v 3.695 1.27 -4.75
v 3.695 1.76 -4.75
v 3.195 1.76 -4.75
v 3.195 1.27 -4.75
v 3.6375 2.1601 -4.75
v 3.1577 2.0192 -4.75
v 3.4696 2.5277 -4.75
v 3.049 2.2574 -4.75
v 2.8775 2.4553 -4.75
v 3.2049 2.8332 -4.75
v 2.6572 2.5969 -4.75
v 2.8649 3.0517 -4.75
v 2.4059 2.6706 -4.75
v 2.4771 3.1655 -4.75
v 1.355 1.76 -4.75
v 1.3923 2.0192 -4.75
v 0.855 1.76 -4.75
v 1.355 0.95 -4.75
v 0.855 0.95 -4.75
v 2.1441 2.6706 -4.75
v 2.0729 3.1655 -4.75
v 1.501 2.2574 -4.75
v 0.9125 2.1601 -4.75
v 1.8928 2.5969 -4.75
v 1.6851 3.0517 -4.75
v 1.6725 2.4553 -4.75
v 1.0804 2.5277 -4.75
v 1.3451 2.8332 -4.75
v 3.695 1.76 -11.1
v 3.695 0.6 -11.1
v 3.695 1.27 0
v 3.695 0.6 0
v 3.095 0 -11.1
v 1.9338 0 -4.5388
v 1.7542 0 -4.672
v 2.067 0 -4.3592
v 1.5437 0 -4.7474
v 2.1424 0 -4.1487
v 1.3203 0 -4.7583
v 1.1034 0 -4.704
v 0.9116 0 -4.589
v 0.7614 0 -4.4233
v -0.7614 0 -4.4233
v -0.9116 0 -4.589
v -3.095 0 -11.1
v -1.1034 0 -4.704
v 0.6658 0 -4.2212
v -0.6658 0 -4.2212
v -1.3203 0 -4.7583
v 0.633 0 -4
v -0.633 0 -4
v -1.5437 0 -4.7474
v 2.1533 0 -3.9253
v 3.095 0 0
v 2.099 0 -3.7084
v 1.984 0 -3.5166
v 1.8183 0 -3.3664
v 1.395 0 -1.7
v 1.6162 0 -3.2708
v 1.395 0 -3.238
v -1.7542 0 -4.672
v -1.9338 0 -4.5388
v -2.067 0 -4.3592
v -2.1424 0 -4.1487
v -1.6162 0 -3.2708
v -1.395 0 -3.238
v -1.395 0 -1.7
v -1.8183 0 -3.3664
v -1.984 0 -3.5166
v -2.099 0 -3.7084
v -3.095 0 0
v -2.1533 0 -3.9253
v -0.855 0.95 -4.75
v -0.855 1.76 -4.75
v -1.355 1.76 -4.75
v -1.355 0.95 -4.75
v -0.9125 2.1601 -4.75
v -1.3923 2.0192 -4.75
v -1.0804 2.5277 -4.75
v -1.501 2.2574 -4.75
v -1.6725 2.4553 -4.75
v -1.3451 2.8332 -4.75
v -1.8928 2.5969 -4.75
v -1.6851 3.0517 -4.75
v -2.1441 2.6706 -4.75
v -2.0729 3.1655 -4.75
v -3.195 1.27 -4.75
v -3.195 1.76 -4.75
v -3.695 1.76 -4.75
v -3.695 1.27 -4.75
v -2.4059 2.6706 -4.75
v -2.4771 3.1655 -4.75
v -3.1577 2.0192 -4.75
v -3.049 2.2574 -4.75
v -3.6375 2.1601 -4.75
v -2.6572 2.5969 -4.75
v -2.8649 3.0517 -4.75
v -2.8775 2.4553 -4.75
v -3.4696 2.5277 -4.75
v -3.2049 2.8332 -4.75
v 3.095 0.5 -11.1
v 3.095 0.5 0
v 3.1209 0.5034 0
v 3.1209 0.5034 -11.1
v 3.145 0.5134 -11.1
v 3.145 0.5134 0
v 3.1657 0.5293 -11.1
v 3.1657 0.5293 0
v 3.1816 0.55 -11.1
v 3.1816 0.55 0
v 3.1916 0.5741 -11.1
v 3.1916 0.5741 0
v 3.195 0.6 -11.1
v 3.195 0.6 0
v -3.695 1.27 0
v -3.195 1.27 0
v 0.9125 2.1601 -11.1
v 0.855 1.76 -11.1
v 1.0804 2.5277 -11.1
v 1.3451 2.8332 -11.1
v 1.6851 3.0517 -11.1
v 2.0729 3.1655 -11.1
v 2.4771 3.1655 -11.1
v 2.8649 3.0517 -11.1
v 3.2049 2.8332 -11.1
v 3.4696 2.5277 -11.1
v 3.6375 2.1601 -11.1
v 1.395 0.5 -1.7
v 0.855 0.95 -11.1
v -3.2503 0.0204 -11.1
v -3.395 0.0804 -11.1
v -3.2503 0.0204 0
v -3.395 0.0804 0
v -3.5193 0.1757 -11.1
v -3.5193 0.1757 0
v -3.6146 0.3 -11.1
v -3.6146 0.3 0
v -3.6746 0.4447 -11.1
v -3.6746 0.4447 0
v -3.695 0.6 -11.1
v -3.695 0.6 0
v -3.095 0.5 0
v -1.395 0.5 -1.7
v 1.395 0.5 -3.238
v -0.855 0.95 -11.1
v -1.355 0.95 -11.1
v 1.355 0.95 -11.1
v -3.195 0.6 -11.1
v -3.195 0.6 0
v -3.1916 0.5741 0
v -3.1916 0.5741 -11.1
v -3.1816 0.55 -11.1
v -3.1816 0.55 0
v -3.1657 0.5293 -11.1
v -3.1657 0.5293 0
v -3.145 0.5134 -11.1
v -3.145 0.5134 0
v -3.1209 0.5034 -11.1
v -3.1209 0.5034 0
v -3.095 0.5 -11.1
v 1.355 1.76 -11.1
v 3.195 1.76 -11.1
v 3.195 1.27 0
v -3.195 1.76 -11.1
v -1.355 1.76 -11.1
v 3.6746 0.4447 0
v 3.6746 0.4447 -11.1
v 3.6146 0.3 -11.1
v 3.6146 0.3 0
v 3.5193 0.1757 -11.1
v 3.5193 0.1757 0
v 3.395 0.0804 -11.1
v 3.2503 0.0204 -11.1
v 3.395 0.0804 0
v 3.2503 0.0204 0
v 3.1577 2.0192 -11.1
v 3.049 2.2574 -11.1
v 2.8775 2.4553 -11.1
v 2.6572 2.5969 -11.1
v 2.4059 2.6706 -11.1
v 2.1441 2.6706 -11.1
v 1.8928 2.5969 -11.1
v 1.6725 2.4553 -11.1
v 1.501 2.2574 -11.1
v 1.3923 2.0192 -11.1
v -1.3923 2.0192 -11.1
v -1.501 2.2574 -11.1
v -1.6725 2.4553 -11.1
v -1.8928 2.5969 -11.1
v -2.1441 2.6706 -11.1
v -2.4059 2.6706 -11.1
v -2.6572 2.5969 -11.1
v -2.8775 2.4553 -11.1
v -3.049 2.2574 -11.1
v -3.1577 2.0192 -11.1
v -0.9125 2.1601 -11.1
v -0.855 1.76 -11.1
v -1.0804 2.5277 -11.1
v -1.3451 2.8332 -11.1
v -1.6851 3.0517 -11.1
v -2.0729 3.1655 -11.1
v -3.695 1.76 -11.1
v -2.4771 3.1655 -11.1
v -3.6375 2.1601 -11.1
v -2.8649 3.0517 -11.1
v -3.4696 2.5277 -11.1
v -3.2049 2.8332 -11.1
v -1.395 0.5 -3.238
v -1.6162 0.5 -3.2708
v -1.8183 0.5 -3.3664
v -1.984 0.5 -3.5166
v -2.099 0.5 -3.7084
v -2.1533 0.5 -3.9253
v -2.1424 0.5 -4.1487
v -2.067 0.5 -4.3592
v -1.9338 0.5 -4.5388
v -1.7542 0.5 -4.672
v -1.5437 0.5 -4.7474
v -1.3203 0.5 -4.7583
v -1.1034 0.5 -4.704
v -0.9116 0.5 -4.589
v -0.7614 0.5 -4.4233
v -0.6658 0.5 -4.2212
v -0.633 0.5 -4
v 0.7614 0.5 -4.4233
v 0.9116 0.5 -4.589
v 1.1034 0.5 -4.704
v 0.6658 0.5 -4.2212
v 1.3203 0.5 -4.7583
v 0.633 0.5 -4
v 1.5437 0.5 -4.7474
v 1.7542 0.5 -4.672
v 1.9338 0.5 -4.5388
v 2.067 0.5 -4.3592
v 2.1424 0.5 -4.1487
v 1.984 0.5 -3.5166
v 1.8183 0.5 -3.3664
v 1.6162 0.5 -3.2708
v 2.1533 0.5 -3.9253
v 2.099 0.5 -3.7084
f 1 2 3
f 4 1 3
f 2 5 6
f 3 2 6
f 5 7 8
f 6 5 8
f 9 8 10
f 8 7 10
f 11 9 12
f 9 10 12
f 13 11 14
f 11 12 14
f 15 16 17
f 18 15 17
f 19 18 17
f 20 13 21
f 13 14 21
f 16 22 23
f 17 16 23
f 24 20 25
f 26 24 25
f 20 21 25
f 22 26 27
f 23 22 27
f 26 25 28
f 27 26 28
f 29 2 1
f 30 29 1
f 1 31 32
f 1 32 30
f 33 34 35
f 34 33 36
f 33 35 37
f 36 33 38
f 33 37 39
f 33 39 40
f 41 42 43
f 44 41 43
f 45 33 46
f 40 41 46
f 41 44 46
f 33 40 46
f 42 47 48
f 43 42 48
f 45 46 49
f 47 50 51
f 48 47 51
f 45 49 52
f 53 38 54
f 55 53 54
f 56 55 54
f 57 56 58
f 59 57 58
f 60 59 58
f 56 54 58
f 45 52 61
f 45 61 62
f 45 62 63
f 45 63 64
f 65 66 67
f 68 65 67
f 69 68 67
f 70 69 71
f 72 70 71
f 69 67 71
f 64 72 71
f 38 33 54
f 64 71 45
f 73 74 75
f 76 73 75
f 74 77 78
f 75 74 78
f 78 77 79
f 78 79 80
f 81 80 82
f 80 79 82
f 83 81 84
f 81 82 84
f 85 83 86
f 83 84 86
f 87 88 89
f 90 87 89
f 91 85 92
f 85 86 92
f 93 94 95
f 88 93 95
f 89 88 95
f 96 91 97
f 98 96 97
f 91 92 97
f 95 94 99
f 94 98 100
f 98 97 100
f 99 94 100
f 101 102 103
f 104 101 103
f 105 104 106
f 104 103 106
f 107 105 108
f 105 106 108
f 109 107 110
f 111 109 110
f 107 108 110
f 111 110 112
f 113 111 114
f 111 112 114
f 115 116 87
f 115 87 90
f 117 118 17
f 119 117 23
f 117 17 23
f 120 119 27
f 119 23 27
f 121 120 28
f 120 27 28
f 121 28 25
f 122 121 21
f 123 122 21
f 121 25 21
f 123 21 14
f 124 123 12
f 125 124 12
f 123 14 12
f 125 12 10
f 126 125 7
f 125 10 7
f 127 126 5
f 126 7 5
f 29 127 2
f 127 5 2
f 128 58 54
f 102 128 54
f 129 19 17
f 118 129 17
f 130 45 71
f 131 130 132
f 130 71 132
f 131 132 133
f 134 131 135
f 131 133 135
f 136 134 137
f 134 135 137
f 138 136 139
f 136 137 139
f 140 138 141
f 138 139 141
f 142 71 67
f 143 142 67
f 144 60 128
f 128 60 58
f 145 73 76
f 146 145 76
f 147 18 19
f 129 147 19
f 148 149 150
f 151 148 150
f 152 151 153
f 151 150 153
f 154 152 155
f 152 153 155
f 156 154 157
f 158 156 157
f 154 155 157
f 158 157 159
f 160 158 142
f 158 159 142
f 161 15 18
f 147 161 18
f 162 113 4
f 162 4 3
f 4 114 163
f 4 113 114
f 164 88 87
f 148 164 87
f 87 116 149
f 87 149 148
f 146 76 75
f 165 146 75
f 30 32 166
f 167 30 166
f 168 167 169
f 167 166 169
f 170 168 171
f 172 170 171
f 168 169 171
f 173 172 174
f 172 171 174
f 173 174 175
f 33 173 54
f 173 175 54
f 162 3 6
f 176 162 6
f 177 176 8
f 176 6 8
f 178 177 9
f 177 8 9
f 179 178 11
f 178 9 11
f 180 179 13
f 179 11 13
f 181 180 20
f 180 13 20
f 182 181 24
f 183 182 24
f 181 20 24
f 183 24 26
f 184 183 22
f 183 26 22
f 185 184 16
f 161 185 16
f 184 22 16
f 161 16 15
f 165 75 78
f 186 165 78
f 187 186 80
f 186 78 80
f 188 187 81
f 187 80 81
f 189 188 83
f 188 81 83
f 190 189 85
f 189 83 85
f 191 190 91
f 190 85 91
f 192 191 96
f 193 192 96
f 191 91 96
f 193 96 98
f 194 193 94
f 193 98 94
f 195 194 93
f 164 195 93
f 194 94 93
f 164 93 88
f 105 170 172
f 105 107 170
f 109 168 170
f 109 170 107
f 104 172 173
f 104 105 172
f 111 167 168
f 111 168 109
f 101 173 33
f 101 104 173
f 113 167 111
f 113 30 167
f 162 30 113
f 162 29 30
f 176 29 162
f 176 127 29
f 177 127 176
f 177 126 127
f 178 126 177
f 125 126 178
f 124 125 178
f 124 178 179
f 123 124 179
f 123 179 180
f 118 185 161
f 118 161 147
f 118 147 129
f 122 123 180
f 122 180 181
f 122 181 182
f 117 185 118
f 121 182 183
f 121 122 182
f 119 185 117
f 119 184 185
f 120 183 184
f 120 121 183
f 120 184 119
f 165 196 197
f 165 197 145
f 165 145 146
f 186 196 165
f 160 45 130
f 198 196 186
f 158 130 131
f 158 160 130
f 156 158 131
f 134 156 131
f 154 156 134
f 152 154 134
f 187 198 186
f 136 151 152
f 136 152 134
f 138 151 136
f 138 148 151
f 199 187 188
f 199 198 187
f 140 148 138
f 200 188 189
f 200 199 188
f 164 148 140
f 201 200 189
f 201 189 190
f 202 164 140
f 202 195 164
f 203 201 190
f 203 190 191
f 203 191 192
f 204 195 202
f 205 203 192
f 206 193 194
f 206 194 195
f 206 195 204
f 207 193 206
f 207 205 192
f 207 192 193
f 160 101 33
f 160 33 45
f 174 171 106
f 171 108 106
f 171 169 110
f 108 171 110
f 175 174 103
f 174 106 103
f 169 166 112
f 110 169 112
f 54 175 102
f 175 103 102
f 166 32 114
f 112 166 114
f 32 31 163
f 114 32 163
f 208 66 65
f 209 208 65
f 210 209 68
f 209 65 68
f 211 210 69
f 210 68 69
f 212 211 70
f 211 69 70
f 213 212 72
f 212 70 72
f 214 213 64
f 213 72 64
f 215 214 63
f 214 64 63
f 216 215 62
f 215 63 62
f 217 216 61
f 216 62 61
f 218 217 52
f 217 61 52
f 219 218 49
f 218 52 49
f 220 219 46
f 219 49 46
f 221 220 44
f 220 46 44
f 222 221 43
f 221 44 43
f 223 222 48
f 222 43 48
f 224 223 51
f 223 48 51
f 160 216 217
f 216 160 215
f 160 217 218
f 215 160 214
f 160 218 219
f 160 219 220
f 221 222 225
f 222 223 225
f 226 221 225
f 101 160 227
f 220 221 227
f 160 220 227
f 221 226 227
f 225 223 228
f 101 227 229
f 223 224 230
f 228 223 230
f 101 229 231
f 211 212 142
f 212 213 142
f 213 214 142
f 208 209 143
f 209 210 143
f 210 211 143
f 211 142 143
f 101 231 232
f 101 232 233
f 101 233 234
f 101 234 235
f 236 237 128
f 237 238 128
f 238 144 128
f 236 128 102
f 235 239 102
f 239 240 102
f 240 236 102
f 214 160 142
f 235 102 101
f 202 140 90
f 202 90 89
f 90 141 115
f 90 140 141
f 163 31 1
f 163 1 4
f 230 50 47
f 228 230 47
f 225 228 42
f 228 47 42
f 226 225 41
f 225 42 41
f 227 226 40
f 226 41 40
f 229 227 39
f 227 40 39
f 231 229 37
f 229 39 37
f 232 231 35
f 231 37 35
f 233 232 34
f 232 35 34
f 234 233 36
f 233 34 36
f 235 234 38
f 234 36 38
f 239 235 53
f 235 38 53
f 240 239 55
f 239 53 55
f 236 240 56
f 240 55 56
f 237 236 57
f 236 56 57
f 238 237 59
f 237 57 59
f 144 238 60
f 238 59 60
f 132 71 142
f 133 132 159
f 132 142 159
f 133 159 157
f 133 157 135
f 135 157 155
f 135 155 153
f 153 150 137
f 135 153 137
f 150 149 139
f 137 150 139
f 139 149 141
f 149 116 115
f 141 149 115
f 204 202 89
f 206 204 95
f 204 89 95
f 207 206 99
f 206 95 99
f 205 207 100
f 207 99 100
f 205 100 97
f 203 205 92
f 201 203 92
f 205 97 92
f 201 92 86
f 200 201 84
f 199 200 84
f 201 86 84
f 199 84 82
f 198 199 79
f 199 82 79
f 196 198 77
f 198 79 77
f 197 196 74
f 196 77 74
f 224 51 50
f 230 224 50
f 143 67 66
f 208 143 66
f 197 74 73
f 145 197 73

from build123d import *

# Parameters (mm, degrees)
BOSS_EXTRUDE1_DEPTH = 11.1
CUT_EXTRUDE1_REACH  = 14.123
CUT_EXTRUDE2_DEPTH  = 4.75


with BuildPart() as part:
    # Sketch1 → Boss-Extrude1 (new body)
    with BuildSketch(Plane.XY):
        with BuildLine():
            Line((0, 0), (-3.095, 0))
            ThreePointArc((-3.095, 0), (-3.519264069, 0.175735931), (-3.695, 0.6))
            Line((-3.695, 0.6), (-3.695, 1.76))
            ThreePointArc((-3.695, 1.76), (-2.275, 3.18), (-0.855, 1.76))
            Line((-0.855, 1.76), (-0.855, 0.95))
            Line((-0.855, 0.95), (-1.355, 0.95))
            Line((-1.355, 0.95), (-1.355, 1.76))
            ThreePointArc((-1.355, 1.76), (-2.275, 2.68), (-3.195, 1.76))
            Line((-3.195, 1.76), (-3.195, 0.6))
            ThreePointArc((-3.195, 0.6), (-3.165710678, 0.529289322), (-3.095, 0.5))
            Line((-3.095, 0.5), (0, 0.5))
            Line((0, 0.5), (3.095, 0.5))
            ThreePointArc((3.095, 0.5), (3.165710678, 0.529289322), (3.195, 0.6))
            Line((3.195, 0.6), (3.195, 1.76))
            ThreePointArc((3.195, 1.76), (2.275, 2.68), (1.355, 1.76))
            Line((1.355, 1.76), (1.355, 0.95))
            Line((1.355, 0.95), (0.855, 0.95))
            Line((0.855, 0.95), (0.855, 1.76))
            ThreePointArc((0.855, 1.76), (2.275, 3.18), (3.695, 1.76))
            Line((3.695, 1.76), (3.695, 0.6))
            ThreePointArc((3.695, 0.6), (3.519264069, 0.175735931), (3.095, 0))
            Line((3.095, 0), (0, 0))
        make_face()
    extrude(amount=-BOSS_EXTRUDE1_DEPTH)

    # Sketch2 → Cut-Extrude1 (cut, up to next)
    with BuildSketch(Plane.XZ, mode=Mode.PRIVATE) as cut_extrude1_sk1:
        with BuildLine():
            Line((-3.095, 0), (-1.395, -1.7))
            Line((-1.395, -1.7), (-1.395, -3.238))
            ThreePointArc((-1.395, -3.238), (-1.933815367, -4.538815367), (-0.633, -4))
            Line((-0.633, -4), (0.633, -4))
            ThreePointArc((0.633, -4), (1.933815367, -4.538815367), (1.395, -3.238))
            Line((1.395, -3.238), (1.395, -1.7))
            Line((1.395, -1.7), (3.095, 0))
            Line((3.095, 0), (3.095, 0.537500588))
            Line((3.095, 0.537500588), (-3.095, 0.537500588))
            Line((-3.095, 0.537500588), (-3.095, 0))
        make_face()
    cut_extrude1_tool1 = extrude(cut_extrude1_sk1.sketch, amount=-CUT_EXTRUDE1_REACH, mode=Mode.PRIVATE) & part.part
    add(cut_extrude1_tool1.solids().sort_by_distance((0, 0, -1.705502))[0], mode=Mode.SUBTRACT)

    # Sketch3 → Cut-Extrude2 (cut)
    with BuildSketch(Plane.XY):
        Polygon((-3.695, 3.311724778), (3.695, 3.311724778), (3.695, 1.27), (3.095, 1.27), (3.095, 0.77), (-3.095, 0.77), (-3.095, 1.27), (-3.695, 1.27), align=None)
    extrude(amount=-CUT_EXTRUDE2_DEPTH, mode=Mode.SUBTRACT)


solid = part.part
